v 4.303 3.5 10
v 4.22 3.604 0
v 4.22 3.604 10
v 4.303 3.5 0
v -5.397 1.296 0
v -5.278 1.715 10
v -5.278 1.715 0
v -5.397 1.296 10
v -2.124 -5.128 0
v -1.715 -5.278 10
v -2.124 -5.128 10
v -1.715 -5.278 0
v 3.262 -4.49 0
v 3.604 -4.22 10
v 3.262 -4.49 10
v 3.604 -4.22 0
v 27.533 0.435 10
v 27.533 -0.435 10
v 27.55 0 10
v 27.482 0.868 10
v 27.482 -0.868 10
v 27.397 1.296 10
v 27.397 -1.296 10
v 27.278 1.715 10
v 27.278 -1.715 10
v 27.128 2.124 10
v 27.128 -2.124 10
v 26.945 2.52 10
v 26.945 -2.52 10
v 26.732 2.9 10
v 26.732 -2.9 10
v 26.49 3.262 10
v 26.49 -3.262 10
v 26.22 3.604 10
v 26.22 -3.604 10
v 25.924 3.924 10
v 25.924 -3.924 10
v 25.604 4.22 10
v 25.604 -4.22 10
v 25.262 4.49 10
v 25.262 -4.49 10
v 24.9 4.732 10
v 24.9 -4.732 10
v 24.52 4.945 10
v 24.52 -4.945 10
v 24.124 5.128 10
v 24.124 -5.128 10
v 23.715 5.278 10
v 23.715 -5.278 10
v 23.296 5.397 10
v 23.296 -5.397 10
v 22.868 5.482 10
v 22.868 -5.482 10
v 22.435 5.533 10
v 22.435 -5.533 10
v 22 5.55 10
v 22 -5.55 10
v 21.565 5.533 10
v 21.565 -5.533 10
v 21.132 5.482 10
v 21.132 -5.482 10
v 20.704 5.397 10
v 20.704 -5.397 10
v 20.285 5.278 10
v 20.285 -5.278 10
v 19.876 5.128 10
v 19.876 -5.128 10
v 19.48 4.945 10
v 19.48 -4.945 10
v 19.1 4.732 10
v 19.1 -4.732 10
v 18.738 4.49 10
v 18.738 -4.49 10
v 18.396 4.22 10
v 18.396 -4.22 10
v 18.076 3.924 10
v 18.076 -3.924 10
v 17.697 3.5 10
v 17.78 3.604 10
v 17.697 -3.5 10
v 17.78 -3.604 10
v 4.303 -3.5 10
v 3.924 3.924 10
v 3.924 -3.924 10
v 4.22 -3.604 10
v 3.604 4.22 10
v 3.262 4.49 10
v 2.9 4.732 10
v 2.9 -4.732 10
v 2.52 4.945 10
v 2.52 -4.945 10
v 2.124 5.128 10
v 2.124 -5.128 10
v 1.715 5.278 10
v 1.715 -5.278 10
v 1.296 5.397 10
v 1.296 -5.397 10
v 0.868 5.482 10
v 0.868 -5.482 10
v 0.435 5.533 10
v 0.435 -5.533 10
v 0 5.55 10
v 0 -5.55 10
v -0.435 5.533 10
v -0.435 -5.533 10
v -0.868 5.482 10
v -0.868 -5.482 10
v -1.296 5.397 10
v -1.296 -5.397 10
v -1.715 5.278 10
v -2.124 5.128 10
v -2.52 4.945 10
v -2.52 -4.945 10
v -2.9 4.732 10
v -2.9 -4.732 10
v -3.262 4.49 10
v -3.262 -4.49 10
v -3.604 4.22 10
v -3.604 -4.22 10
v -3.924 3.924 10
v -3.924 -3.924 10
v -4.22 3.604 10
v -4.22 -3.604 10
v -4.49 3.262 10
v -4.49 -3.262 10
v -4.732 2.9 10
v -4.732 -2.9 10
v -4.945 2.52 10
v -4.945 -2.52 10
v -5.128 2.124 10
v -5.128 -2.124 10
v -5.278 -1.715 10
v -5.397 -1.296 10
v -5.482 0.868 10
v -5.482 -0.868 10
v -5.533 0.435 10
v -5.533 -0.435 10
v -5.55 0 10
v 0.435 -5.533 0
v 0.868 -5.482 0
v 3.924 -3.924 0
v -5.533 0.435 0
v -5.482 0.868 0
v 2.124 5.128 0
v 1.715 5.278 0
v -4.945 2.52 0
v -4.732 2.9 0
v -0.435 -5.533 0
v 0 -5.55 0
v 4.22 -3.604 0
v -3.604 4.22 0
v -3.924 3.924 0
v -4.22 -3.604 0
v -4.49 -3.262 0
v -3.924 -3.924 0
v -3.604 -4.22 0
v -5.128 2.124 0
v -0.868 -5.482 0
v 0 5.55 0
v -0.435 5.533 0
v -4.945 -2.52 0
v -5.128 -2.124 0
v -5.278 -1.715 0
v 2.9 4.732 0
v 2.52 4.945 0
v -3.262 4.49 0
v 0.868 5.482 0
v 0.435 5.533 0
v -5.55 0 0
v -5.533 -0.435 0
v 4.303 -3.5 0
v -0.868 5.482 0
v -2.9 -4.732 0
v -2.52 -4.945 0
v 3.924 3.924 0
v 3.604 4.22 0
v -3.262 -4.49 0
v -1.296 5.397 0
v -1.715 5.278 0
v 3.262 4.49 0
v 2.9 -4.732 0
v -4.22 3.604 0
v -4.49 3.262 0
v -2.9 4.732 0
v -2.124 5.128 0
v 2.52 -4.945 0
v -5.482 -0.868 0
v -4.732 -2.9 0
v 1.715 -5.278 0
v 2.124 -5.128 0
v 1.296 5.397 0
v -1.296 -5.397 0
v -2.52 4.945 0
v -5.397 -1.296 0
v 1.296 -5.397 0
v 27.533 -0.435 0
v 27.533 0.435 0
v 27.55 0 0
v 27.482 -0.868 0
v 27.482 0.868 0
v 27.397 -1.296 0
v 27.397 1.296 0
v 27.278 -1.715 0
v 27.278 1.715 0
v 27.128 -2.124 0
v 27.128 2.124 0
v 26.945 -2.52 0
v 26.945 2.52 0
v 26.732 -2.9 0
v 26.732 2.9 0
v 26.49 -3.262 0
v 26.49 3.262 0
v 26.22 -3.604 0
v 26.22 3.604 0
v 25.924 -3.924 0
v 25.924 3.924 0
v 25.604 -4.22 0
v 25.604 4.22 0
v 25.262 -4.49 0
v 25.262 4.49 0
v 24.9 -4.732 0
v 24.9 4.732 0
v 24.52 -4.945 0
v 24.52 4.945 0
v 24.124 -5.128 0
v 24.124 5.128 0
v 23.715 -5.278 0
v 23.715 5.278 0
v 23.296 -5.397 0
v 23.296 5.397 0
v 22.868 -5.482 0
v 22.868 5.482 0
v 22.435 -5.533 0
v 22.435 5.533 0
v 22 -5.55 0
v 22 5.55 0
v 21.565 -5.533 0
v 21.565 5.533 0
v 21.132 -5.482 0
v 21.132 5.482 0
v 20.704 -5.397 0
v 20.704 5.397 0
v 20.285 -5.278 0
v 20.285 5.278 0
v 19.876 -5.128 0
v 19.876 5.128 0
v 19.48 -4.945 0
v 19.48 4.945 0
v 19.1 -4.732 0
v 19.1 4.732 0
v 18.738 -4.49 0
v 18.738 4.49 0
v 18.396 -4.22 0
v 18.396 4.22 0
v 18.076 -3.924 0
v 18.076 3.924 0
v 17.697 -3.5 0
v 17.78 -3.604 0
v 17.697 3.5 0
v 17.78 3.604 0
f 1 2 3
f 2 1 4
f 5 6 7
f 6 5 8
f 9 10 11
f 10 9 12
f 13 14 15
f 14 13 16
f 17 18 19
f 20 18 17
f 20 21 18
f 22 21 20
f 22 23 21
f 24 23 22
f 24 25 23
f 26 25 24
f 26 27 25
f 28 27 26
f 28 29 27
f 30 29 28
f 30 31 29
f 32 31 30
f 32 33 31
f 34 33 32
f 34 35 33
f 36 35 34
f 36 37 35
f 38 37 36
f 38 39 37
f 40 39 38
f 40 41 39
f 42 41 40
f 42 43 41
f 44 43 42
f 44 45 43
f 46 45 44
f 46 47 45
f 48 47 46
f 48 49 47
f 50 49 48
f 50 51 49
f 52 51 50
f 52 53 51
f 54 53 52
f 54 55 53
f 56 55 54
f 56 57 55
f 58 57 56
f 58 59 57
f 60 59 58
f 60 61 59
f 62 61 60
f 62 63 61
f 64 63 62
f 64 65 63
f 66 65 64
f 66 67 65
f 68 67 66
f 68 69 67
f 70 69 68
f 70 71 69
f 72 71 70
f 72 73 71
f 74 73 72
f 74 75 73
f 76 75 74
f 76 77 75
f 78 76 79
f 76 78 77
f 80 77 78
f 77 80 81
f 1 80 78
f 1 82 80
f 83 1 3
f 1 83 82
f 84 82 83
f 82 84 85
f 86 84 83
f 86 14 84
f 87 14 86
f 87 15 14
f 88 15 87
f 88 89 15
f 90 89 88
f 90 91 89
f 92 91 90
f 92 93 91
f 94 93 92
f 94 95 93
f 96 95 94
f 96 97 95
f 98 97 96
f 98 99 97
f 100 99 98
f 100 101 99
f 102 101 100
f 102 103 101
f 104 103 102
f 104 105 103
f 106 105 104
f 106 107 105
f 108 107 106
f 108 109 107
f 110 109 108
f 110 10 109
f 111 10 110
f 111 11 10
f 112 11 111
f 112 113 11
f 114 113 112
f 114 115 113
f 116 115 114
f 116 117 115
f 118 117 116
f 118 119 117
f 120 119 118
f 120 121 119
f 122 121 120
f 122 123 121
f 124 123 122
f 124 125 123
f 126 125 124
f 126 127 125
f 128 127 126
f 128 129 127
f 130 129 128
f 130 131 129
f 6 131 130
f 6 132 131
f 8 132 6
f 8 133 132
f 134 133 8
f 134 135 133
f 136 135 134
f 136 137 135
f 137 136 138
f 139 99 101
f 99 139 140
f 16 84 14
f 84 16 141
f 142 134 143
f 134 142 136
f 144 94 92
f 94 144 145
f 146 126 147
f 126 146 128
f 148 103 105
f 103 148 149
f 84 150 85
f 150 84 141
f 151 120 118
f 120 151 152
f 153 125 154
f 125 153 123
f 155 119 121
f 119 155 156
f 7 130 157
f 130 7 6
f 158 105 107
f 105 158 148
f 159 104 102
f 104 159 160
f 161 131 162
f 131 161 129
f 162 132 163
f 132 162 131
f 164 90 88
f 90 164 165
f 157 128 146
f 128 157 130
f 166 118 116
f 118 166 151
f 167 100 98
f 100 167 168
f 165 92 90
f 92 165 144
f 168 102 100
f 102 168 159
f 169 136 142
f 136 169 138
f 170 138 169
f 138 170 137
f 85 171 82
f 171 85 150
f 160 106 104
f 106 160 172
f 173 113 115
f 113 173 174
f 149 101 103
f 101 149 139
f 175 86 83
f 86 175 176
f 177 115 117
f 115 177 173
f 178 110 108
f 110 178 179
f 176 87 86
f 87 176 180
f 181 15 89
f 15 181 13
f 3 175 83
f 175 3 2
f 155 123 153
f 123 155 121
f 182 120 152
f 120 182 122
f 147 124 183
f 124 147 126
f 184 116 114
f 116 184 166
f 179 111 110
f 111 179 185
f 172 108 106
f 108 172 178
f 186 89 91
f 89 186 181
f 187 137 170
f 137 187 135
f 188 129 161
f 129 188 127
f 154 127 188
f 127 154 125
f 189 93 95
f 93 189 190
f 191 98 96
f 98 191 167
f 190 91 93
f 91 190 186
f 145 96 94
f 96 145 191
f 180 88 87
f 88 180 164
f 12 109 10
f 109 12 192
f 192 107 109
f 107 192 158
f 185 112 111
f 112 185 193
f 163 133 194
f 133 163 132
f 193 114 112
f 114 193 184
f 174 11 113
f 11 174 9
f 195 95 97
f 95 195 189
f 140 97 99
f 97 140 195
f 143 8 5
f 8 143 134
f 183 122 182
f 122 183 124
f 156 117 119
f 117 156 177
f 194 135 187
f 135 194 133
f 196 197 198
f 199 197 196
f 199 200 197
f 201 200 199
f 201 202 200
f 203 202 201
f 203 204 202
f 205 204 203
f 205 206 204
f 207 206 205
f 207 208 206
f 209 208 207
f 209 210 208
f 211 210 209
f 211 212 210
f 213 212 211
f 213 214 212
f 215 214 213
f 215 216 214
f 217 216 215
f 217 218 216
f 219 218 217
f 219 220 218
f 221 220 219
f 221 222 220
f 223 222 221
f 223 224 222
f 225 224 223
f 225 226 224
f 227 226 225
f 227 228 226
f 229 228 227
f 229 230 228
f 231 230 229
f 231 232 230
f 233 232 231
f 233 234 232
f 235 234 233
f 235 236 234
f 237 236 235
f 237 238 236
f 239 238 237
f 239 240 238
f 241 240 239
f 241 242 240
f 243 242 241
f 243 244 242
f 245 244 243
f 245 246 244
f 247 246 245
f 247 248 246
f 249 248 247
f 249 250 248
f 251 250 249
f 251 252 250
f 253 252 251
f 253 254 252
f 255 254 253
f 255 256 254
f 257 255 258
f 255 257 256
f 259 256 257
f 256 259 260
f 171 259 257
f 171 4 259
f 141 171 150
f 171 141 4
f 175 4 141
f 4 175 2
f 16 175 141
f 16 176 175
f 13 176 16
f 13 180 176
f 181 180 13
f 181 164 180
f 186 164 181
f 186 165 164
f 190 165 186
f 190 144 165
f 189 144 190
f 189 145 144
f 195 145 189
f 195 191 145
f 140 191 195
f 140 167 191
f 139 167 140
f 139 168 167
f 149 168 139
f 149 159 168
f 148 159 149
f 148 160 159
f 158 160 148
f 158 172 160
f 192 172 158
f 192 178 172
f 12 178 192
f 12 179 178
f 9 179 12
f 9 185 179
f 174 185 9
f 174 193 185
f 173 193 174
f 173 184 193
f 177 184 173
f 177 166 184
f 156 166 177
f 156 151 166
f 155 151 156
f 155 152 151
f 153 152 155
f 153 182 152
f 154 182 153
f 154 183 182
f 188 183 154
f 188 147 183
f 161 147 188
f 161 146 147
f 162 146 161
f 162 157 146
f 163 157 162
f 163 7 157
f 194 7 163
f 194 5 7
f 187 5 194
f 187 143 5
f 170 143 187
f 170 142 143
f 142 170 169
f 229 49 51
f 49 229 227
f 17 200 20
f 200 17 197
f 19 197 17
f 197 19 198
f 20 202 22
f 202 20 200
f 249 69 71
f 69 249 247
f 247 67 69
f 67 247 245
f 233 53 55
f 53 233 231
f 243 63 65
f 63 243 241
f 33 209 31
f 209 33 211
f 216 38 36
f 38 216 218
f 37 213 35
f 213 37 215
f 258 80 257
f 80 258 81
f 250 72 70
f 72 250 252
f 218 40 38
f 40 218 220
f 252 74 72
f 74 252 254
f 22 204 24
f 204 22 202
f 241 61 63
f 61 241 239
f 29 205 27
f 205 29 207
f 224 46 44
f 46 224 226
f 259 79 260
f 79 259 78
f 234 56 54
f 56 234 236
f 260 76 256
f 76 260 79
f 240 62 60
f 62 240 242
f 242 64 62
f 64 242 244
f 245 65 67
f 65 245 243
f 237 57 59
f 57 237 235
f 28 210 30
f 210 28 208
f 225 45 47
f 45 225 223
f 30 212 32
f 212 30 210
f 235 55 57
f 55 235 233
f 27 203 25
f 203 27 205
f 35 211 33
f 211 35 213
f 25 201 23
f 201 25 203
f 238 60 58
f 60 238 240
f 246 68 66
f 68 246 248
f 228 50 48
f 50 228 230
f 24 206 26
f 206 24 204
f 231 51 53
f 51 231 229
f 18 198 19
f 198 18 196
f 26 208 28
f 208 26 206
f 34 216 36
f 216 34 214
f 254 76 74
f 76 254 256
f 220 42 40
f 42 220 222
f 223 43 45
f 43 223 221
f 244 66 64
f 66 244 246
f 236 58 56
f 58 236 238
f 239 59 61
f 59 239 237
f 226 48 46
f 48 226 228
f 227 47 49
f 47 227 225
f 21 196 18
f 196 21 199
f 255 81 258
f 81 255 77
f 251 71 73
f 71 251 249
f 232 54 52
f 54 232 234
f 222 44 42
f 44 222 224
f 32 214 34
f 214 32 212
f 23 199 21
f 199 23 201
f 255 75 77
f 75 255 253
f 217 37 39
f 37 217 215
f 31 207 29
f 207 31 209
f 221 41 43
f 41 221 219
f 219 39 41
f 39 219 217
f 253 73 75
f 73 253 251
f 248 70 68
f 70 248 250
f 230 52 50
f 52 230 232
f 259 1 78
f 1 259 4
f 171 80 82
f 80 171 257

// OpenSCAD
$fn=80;

// Config
pin_height = 10;
pin_diameter = 11.1;
pin_spacing = 22;
connector_wid= 7;
cutout = pin_diameter/6;
cutout_radius=pin_diameter/3;
start_angle=30;

module pin(location) {
    translate(v=location)
    {
        cylinder(
            d=pin_diameter,
            h=pin_height,
            center=false
        );
    }
}

pin([0, 0, 0]);
pin([pin_spacing, 0, 0]);
    
color("brown")
{
    translate([0, -connector_wid/2, 0])
    {
        cube(size = [pin_spacing, connector_wid, pin_height], center = false);
    }
}
    
    
    
        
    
    //r=10;
    //color("red") 
    //{
    //    {
    //        for (i = [0:10:360]) {
    //            translate([r*cos(i), r*sin(i), 0]) {
    //                cylinder(r=1,
    //                    h=pin_height);
    //            }
    //        }
//    }
//}
